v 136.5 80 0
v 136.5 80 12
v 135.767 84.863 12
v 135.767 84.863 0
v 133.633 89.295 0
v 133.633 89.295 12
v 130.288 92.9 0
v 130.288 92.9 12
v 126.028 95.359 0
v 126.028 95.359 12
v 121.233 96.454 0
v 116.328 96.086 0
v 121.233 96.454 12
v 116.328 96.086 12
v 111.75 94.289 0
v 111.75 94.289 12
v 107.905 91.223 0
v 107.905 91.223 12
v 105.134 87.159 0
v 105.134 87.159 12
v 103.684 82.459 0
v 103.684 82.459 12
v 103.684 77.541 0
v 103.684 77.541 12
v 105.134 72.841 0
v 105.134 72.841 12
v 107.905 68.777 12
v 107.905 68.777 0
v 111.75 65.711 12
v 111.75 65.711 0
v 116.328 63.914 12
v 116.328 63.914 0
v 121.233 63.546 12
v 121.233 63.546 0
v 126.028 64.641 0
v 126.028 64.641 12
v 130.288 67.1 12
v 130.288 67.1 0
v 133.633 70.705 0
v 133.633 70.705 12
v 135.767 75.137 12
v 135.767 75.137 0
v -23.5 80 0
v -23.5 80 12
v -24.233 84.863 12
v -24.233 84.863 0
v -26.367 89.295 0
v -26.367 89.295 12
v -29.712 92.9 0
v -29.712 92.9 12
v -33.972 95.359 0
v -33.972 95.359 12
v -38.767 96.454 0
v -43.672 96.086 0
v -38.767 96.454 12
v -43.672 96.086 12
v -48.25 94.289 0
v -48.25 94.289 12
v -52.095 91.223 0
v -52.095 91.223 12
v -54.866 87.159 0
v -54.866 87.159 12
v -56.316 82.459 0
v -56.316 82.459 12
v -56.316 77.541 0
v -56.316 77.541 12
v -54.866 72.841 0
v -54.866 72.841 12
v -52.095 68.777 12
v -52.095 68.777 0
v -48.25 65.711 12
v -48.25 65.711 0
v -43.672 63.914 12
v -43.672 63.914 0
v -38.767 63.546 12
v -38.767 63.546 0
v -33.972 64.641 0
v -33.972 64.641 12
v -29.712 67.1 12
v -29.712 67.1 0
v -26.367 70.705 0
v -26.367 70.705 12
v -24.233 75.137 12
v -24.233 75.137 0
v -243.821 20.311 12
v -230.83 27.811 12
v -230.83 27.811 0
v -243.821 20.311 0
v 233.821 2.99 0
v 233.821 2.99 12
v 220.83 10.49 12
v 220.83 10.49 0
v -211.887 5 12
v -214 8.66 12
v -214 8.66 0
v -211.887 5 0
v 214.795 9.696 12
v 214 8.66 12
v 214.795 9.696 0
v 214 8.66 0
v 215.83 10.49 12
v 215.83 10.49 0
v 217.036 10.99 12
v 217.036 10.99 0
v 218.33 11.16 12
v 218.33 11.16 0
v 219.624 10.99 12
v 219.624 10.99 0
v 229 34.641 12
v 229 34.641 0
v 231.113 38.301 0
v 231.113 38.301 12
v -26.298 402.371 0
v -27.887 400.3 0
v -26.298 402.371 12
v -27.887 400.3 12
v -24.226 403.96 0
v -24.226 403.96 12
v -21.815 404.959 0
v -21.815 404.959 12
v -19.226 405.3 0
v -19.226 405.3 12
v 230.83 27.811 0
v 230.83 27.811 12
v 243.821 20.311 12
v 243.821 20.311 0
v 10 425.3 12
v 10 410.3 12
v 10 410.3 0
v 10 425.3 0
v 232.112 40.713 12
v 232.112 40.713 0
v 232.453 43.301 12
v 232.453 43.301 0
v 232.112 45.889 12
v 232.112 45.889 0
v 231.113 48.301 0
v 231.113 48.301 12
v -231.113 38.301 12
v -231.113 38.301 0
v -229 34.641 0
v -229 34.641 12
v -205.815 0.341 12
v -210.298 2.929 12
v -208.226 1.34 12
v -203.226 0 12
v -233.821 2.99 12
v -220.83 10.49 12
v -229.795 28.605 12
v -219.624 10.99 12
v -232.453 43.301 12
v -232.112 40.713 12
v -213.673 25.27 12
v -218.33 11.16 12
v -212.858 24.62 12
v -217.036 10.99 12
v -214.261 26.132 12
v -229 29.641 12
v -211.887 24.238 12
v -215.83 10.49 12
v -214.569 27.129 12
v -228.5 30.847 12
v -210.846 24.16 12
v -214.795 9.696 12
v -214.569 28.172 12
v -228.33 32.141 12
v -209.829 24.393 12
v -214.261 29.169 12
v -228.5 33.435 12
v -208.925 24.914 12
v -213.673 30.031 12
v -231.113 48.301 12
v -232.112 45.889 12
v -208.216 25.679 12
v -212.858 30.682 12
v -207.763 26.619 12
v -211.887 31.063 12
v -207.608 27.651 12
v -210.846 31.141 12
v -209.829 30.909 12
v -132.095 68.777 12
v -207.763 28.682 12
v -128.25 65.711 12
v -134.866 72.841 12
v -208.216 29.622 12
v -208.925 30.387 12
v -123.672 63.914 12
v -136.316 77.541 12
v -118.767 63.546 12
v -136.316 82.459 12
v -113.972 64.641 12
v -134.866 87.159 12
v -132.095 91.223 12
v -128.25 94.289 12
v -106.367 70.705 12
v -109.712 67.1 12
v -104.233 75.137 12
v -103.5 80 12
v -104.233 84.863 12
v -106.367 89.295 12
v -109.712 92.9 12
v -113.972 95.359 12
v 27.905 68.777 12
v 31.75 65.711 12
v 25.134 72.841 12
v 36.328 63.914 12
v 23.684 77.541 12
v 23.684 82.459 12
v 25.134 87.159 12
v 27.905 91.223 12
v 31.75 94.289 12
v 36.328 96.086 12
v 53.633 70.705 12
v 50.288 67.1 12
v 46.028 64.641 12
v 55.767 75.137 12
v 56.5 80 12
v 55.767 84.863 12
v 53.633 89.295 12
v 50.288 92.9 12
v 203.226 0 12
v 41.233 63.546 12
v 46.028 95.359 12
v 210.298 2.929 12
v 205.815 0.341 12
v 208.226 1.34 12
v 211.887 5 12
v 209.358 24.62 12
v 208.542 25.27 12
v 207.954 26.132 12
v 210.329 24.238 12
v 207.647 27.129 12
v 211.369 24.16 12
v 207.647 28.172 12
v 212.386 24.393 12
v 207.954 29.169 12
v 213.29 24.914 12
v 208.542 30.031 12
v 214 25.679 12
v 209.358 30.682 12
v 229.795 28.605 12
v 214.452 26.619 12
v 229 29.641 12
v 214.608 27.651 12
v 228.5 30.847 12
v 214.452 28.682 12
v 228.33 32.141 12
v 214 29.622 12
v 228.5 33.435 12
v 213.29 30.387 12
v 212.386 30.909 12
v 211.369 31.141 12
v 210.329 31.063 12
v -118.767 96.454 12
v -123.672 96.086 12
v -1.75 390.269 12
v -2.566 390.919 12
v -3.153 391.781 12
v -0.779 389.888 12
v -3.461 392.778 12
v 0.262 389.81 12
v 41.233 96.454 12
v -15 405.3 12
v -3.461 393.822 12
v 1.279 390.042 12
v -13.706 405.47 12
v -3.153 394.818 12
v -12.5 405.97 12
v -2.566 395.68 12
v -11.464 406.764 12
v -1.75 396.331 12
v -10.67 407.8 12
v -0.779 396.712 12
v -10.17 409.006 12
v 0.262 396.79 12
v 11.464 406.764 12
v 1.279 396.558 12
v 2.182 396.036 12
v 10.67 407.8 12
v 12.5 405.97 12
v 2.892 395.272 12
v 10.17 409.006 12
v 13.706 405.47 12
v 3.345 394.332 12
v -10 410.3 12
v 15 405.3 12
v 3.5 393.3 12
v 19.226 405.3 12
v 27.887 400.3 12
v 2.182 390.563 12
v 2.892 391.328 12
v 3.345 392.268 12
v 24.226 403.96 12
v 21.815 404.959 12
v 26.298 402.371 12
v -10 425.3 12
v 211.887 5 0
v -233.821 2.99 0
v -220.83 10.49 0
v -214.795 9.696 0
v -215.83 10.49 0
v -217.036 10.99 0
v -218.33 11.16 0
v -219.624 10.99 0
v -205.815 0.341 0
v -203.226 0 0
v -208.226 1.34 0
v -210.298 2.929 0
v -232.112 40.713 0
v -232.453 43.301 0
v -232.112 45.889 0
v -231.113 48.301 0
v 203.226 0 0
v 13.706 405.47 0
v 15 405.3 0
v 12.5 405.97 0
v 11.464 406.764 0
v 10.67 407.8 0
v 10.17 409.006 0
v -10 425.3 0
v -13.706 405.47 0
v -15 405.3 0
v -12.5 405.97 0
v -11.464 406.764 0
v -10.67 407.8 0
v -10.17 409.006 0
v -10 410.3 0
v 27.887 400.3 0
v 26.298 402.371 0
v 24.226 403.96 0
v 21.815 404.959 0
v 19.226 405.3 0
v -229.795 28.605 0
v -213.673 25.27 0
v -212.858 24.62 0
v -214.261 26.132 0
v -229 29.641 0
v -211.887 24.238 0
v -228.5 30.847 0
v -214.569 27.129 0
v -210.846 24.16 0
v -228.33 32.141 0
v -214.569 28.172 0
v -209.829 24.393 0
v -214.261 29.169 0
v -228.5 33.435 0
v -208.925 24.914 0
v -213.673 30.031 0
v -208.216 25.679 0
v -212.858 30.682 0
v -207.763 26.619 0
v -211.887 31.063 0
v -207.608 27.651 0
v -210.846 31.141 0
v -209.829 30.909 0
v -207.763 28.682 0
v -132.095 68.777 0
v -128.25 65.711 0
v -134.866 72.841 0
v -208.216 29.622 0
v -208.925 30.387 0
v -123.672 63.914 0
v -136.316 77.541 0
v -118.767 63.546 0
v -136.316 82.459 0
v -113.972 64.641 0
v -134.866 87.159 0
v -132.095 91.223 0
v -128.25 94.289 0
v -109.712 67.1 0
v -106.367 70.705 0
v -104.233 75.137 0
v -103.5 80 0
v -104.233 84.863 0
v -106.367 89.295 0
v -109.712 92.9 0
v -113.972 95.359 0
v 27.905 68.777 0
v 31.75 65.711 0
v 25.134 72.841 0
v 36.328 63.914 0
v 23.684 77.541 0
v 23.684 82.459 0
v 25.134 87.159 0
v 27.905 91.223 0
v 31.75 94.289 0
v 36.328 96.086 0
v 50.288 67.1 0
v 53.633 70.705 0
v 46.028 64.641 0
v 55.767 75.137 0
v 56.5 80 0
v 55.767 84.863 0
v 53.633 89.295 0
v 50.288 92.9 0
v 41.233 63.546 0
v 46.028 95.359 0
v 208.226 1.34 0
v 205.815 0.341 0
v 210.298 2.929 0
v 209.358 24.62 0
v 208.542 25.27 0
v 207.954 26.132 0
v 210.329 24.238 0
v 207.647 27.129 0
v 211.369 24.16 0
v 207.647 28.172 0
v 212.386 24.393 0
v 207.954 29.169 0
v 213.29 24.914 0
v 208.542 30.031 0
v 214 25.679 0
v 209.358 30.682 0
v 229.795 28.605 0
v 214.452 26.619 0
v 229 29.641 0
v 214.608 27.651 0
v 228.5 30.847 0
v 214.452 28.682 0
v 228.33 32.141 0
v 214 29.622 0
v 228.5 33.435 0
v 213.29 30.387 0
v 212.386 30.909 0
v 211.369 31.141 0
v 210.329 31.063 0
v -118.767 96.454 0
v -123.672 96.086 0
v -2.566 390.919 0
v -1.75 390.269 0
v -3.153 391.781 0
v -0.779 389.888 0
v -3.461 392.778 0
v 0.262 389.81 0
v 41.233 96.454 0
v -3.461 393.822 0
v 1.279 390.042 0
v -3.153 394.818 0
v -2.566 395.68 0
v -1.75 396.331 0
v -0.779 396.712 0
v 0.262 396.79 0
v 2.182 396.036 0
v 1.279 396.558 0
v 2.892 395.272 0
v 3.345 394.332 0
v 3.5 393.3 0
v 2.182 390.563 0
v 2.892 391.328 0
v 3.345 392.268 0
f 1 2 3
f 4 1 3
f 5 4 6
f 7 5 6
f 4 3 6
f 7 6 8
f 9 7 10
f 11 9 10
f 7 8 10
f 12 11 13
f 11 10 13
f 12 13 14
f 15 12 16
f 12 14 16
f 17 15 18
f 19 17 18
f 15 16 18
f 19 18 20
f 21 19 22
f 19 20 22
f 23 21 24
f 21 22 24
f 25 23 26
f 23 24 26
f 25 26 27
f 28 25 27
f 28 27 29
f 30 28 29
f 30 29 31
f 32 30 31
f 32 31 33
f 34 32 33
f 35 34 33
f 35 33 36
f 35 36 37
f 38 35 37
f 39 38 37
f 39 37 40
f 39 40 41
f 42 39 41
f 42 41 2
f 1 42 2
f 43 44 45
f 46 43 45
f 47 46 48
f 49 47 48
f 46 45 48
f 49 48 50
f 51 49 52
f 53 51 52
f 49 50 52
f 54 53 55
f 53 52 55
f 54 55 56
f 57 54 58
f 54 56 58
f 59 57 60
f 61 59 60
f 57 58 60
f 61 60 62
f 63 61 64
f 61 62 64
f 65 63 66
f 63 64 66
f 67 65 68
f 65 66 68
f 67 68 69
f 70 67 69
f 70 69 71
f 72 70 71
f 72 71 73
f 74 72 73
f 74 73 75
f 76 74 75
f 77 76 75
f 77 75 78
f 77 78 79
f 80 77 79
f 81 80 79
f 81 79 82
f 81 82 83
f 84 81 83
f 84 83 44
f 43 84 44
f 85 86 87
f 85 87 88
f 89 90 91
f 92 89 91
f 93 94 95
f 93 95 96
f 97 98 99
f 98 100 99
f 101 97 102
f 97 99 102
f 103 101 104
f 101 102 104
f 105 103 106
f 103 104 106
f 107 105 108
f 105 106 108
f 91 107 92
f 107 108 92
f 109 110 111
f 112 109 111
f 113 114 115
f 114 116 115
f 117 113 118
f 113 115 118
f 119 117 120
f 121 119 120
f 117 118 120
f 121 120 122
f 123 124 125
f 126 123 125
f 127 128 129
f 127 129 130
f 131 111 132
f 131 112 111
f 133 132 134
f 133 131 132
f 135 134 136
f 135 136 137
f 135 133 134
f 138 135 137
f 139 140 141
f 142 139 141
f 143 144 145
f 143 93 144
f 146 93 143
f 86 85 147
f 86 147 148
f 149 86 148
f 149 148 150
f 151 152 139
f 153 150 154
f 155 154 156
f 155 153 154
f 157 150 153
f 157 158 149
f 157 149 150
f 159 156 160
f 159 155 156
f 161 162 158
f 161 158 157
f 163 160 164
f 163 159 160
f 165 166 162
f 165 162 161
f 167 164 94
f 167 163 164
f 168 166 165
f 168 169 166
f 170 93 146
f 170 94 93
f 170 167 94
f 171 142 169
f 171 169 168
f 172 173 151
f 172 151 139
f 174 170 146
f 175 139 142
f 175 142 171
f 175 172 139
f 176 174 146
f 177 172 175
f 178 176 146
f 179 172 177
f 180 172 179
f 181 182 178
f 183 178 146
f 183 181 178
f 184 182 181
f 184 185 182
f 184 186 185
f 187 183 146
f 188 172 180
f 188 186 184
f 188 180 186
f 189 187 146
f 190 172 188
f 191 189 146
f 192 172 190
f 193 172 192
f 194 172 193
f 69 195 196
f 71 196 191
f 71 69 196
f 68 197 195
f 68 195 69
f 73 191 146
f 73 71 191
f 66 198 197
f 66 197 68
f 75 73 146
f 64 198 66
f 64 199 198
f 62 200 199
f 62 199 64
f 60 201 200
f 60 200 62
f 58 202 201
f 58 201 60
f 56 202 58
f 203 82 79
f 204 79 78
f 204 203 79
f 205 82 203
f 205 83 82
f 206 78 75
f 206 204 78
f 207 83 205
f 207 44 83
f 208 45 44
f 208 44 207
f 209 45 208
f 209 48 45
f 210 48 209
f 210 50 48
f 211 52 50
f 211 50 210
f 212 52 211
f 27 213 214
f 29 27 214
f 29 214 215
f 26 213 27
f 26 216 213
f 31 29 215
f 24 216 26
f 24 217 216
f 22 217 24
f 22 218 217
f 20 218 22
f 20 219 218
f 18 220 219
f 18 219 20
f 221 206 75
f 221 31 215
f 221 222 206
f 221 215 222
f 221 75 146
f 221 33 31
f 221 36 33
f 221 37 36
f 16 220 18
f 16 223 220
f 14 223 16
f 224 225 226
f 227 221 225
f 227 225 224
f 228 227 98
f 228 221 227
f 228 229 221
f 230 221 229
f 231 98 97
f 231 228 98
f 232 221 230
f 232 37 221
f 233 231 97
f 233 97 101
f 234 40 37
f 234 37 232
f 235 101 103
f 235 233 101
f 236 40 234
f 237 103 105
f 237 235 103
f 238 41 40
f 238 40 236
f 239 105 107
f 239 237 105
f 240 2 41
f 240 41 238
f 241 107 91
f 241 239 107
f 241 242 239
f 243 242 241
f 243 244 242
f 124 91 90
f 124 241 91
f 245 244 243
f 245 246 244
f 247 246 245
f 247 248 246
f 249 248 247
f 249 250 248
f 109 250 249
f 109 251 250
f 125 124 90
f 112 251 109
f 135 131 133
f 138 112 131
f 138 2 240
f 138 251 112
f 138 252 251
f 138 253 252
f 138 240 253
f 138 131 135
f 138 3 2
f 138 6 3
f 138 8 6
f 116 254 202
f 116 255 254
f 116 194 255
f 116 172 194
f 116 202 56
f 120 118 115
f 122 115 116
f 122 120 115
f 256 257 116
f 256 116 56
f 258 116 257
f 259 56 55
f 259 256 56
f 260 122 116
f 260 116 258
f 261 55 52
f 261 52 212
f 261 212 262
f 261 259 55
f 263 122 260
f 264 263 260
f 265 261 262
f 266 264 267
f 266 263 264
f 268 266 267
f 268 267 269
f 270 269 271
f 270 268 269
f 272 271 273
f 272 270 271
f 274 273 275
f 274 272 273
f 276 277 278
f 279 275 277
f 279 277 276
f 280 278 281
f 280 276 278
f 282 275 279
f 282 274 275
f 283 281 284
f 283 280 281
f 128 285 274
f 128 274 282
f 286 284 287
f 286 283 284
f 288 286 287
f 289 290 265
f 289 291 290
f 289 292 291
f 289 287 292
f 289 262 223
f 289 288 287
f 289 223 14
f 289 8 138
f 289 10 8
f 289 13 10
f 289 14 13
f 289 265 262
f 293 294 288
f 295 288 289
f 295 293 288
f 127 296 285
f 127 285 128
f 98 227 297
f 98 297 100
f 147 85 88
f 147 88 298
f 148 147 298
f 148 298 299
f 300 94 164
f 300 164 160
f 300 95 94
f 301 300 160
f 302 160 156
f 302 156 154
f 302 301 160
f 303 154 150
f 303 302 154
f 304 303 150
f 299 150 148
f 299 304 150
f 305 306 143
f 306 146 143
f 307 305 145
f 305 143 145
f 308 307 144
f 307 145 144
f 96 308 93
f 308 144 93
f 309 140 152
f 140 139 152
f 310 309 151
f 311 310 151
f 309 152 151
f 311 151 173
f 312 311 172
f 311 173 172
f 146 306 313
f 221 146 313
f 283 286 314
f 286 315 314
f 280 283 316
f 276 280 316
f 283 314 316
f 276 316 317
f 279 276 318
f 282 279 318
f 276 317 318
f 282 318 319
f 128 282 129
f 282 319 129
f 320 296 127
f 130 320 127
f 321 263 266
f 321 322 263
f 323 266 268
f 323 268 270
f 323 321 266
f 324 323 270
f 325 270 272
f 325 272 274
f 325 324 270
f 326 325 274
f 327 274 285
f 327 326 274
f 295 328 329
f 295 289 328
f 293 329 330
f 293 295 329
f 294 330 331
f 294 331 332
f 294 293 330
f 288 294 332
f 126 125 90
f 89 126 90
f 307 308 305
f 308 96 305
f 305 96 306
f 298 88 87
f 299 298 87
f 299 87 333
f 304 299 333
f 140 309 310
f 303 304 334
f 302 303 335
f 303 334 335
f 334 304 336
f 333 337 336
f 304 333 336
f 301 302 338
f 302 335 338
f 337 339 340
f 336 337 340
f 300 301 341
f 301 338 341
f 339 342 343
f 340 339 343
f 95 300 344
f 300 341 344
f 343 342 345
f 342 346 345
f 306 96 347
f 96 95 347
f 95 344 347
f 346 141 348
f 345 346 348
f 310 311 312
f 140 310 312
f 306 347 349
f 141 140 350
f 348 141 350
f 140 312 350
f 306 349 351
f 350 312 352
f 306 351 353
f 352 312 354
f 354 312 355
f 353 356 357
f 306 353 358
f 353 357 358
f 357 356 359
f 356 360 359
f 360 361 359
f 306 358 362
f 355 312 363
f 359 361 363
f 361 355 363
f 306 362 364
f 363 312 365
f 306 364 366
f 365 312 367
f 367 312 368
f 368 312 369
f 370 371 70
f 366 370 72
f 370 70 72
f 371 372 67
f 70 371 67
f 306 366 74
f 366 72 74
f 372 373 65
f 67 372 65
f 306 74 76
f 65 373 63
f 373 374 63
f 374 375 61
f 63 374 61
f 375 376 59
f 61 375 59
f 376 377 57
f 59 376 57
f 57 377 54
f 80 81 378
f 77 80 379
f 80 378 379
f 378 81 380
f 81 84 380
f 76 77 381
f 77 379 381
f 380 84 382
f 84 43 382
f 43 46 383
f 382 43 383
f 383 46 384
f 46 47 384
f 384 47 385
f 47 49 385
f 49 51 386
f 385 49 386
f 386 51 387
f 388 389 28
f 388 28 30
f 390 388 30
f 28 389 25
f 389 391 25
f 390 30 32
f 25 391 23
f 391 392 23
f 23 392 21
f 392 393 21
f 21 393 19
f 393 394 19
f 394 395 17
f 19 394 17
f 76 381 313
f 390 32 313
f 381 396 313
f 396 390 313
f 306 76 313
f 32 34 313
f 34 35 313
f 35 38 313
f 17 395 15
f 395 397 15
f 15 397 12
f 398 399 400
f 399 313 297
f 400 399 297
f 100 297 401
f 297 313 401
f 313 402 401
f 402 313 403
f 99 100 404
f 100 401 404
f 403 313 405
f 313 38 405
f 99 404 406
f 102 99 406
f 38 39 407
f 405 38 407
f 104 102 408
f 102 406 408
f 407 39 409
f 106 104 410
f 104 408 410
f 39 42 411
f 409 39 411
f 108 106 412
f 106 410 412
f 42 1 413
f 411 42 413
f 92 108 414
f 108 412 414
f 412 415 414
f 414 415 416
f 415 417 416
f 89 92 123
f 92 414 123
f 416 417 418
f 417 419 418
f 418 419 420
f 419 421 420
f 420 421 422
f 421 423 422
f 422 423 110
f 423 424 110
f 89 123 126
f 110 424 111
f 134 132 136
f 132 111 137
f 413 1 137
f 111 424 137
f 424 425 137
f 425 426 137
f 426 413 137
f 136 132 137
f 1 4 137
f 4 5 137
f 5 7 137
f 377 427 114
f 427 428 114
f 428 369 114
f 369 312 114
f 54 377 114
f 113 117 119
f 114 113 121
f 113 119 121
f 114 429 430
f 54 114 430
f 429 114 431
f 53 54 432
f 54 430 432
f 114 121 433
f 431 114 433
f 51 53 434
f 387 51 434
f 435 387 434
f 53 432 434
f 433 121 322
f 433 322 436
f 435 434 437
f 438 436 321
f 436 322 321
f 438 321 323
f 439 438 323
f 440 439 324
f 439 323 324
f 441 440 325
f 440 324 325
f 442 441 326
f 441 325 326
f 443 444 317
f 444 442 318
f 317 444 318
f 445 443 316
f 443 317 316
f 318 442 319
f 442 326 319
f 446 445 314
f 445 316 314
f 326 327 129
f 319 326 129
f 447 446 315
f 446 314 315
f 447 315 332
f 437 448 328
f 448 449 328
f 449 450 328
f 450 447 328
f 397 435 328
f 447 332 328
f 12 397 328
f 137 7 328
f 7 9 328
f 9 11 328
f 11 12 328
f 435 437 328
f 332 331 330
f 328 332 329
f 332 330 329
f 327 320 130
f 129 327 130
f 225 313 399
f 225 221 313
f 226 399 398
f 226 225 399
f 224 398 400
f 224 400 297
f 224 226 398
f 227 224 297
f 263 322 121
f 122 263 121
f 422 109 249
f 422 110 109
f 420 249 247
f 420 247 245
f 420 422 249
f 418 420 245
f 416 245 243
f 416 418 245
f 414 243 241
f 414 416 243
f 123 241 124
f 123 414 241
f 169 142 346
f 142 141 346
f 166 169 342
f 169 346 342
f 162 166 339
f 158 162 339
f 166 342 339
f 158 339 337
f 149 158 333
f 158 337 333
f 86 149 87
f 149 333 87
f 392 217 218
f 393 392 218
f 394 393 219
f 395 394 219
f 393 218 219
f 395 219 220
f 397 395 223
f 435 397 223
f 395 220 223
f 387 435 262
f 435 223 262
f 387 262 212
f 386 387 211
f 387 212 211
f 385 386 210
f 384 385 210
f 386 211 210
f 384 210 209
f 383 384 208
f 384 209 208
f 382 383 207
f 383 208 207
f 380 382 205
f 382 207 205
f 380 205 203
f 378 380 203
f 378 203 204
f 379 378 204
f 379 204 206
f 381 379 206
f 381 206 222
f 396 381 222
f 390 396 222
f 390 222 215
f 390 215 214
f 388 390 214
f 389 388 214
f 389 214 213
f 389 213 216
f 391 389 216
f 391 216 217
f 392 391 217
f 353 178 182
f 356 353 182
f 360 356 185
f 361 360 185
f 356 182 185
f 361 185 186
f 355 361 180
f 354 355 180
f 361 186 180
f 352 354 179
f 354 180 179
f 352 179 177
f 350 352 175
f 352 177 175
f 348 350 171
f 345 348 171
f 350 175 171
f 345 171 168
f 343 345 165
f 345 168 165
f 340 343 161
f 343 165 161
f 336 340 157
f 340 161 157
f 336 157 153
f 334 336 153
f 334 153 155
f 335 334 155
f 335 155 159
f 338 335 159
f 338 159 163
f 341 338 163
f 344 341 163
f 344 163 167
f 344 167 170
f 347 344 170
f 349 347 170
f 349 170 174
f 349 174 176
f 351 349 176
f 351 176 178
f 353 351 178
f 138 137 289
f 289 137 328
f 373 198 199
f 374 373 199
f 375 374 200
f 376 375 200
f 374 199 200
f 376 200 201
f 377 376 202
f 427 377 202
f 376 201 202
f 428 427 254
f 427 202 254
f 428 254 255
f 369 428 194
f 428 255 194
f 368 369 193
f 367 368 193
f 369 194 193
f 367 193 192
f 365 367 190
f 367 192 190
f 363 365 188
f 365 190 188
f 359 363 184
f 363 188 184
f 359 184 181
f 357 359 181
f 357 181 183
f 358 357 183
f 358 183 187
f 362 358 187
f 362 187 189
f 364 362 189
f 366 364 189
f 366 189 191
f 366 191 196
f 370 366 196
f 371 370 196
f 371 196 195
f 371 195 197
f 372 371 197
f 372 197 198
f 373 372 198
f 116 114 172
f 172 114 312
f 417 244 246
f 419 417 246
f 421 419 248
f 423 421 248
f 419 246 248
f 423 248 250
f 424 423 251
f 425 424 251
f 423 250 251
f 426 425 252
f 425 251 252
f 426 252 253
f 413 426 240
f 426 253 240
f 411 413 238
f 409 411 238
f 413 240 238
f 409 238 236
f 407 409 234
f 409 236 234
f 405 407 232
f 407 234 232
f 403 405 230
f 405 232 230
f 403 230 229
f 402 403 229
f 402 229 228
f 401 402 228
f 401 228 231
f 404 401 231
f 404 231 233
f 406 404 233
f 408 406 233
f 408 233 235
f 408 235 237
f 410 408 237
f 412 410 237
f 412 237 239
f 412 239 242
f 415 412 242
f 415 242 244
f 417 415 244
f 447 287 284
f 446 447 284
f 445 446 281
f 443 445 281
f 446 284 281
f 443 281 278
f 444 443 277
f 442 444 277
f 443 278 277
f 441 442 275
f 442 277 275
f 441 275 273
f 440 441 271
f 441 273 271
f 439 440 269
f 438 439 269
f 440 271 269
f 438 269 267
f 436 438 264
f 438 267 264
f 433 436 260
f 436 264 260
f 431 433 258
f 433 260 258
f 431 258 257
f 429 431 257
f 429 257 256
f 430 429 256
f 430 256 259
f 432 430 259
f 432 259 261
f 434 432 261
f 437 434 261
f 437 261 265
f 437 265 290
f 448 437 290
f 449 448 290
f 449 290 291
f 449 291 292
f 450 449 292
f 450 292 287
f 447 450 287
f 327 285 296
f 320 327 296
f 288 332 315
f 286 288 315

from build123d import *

# Parameters (mm, degrees)
BOSS_EXTRUDE1_DEPTH = 12
CUT_EXTRUDE1_REACH  = 14
SKETCH2_R           = 3.5
FILLET1_R           = 10
CUT_EXTRUDE2_REACH  = 14
SKETCH3_R           = 16.5
SKETCH4_W           = 20
SKETCH4_H           = 20
BOSS_EXTRUDE2_DEPTH = 12
FILLET2_R           = 5


with BuildPart() as part:
    # Sketch1 → Boss-Extrude1 (new body)
    with BuildSketch(Plane.XY):
        Polygon((-209, 0), (209, 0), (234, 43.301270189), (25, 405.299888971), (-25, 405.299888971), (-234, 43.301270189), align=None)
    extrude(amount=BOSS_EXTRUDE1_DEPTH)

    # Sketch2 → Cut-Extrude1 (cut, up to next)
    with BuildSketch(Plane.XY.offset(12), mode=Mode.PRIVATE) as cut_extrude1_sk1:
        with Locations((211.107695155, 27.650635095)):
            Circle(SKETCH2_R)
    cut_extrude1_tool1 = extrude(cut_extrude1_sk1.sketch, amount=-CUT_EXTRUDE1_REACH, mode=Mode.PRIVATE) & part.part
    add(cut_extrude1_tool1.solids().sort_by_distance((211.107695, 27.650635, 12))[0], mode=Mode.SUBTRACT)
    # Sketch2 → Cut-Extrude1 (cut, up to next)
    with BuildSketch(Plane.XY.offset(12), mode=Mode.PRIVATE) as cut_extrude1_sk2:
        with Locations((0, 393.299888971)):
            Circle(SKETCH2_R)
    cut_extrude1_tool2 = extrude(cut_extrude1_sk2.sketch, amount=-CUT_EXTRUDE1_REACH, mode=Mode.PRIVATE) & part.part
    add(cut_extrude1_tool2.solids().sort_by_distance((0, 393.299889, 12))[0], mode=Mode.SUBTRACT)
    # Sketch2 → Cut-Extrude1 (cut, up to next)
    with BuildSketch(Plane.XY.offset(12), mode=Mode.PRIVATE) as cut_extrude1_sk3:
        with Locations((-211.107695155, 27.650635095)):
            Circle(SKETCH2_R)
    cut_extrude1_tool3 = extrude(cut_extrude1_sk3.sketch, amount=-CUT_EXTRUDE1_REACH, mode=Mode.PRIVATE) & part.part
    add(cut_extrude1_tool3.solids().sort_by_distance((-211.107695, 27.650635, 12))[0], mode=Mode.SUBTRACT)

    # Fillet1
    fillet1_edges = [part.edges().sort_by_distance(p)[0] for p in [
        (-25, 405.299888971, 6),
        (25, 405.299888971, 6),
        (234, 43.301270189, 6),
        (209, 0, 6),
        (-209, 0, 6),
        (-234, 43.301270189, 6),
    ]]
    fillet(fillet1_edges, radius=FILLET1_R)

    # Sketch3 → Cut-Extrude2 (cut, up to next)
    with BuildSketch(Plane.XY.offset(12), mode=Mode.PRIVATE) as cut_extrude2_sk1:
        with Locations((-40, 80)):
            Circle(SKETCH3_R)
    cut_extrude2_tool1 = extrude(cut_extrude2_sk1.sketch, amount=-CUT_EXTRUDE2_REACH, mode=Mode.PRIVATE) & part.part
    add(cut_extrude2_tool1.solids().sort_by_distance((-40, 80, 12))[0], mode=Mode.SUBTRACT)
    # Sketch3 → Cut-Extrude2 (cut, up to next)
    with BuildSketch(Plane.XY.offset(12), mode=Mode.PRIVATE) as cut_extrude2_sk2:
        with Locations((40, 80)):
            Circle(SKETCH3_R)
    cut_extrude2_tool2 = extrude(cut_extrude2_sk2.sketch, amount=-CUT_EXTRUDE2_REACH, mode=Mode.PRIVATE) & part.part
    add(cut_extrude2_tool2.solids().sort_by_distance((40, 80, 12))[0], mode=Mode.SUBTRACT)
    # Sketch3 → Cut-Extrude2 (cut, up to next)
    with BuildSketch(Plane.XY.offset(12), mode=Mode.PRIVATE) as cut_extrude2_sk3:
        with Locations((-120, 80)):
            Circle(SKETCH3_R)
    cut_extrude2_tool3 = extrude(cut_extrude2_sk3.sketch, amount=-CUT_EXTRUDE2_REACH, mode=Mode.PRIVATE) & part.part
    add(cut_extrude2_tool3.solids().sort_by_distance((-120, 80, 12))[0], mode=Mode.SUBTRACT)
    # Sketch3 → Cut-Extrude2 (cut, up to next)
    with BuildSketch(Plane.XY.offset(12), mode=Mode.PRIVATE) as cut_extrude2_sk4:
        with Locations((120, 80)):
            Circle(SKETCH3_R)
    cut_extrude2_tool4 = extrude(cut_extrude2_sk4.sketch, amount=-CUT_EXTRUDE2_REACH, mode=Mode.PRIVATE) & part.part
    add(cut_extrude2_tool4.solids().sort_by_distance((120, 80, 12))[0], mode=Mode.SUBTRACT)

    # Sketch4 → Boss-Extrude2 (add)
    with BuildSketch(Plane.XY.offset(12)):
        with Locations((0, 415.299888971)):
            Rectangle(SKETCH4_W, SKETCH4_H)
        Polygon((226.5, 30.310889132), (243.820508076, 20.310889132), (233.820508076, 2.990381057), (216.5, 12.990381057), align=None)
        Polygon((-226.5, 30.310889132), (-243.820508076, 20.310889132), (-233.820508076, 2.990381057), (-216.5, 12.990381057), align=None)
    extrude(amount=-BOSS_EXTRUDE2_DEPTH)

    # Fillet2
    fillet2_edges = [part.edges().sort_by_distance(p)[0] for p in [
        (216.5, 12.990381057, 6),
        (226.5, 30.310889132, 6),
        (-226.5, 30.310889132, 6),
        (-216.5, 12.990381057, 6),
        (10, 405.299888971, 6),
        (-10, 405.299888971, 6),
    ]]
    fillet(fillet2_edges, radius=FILLET2_R)


solid = part.part
